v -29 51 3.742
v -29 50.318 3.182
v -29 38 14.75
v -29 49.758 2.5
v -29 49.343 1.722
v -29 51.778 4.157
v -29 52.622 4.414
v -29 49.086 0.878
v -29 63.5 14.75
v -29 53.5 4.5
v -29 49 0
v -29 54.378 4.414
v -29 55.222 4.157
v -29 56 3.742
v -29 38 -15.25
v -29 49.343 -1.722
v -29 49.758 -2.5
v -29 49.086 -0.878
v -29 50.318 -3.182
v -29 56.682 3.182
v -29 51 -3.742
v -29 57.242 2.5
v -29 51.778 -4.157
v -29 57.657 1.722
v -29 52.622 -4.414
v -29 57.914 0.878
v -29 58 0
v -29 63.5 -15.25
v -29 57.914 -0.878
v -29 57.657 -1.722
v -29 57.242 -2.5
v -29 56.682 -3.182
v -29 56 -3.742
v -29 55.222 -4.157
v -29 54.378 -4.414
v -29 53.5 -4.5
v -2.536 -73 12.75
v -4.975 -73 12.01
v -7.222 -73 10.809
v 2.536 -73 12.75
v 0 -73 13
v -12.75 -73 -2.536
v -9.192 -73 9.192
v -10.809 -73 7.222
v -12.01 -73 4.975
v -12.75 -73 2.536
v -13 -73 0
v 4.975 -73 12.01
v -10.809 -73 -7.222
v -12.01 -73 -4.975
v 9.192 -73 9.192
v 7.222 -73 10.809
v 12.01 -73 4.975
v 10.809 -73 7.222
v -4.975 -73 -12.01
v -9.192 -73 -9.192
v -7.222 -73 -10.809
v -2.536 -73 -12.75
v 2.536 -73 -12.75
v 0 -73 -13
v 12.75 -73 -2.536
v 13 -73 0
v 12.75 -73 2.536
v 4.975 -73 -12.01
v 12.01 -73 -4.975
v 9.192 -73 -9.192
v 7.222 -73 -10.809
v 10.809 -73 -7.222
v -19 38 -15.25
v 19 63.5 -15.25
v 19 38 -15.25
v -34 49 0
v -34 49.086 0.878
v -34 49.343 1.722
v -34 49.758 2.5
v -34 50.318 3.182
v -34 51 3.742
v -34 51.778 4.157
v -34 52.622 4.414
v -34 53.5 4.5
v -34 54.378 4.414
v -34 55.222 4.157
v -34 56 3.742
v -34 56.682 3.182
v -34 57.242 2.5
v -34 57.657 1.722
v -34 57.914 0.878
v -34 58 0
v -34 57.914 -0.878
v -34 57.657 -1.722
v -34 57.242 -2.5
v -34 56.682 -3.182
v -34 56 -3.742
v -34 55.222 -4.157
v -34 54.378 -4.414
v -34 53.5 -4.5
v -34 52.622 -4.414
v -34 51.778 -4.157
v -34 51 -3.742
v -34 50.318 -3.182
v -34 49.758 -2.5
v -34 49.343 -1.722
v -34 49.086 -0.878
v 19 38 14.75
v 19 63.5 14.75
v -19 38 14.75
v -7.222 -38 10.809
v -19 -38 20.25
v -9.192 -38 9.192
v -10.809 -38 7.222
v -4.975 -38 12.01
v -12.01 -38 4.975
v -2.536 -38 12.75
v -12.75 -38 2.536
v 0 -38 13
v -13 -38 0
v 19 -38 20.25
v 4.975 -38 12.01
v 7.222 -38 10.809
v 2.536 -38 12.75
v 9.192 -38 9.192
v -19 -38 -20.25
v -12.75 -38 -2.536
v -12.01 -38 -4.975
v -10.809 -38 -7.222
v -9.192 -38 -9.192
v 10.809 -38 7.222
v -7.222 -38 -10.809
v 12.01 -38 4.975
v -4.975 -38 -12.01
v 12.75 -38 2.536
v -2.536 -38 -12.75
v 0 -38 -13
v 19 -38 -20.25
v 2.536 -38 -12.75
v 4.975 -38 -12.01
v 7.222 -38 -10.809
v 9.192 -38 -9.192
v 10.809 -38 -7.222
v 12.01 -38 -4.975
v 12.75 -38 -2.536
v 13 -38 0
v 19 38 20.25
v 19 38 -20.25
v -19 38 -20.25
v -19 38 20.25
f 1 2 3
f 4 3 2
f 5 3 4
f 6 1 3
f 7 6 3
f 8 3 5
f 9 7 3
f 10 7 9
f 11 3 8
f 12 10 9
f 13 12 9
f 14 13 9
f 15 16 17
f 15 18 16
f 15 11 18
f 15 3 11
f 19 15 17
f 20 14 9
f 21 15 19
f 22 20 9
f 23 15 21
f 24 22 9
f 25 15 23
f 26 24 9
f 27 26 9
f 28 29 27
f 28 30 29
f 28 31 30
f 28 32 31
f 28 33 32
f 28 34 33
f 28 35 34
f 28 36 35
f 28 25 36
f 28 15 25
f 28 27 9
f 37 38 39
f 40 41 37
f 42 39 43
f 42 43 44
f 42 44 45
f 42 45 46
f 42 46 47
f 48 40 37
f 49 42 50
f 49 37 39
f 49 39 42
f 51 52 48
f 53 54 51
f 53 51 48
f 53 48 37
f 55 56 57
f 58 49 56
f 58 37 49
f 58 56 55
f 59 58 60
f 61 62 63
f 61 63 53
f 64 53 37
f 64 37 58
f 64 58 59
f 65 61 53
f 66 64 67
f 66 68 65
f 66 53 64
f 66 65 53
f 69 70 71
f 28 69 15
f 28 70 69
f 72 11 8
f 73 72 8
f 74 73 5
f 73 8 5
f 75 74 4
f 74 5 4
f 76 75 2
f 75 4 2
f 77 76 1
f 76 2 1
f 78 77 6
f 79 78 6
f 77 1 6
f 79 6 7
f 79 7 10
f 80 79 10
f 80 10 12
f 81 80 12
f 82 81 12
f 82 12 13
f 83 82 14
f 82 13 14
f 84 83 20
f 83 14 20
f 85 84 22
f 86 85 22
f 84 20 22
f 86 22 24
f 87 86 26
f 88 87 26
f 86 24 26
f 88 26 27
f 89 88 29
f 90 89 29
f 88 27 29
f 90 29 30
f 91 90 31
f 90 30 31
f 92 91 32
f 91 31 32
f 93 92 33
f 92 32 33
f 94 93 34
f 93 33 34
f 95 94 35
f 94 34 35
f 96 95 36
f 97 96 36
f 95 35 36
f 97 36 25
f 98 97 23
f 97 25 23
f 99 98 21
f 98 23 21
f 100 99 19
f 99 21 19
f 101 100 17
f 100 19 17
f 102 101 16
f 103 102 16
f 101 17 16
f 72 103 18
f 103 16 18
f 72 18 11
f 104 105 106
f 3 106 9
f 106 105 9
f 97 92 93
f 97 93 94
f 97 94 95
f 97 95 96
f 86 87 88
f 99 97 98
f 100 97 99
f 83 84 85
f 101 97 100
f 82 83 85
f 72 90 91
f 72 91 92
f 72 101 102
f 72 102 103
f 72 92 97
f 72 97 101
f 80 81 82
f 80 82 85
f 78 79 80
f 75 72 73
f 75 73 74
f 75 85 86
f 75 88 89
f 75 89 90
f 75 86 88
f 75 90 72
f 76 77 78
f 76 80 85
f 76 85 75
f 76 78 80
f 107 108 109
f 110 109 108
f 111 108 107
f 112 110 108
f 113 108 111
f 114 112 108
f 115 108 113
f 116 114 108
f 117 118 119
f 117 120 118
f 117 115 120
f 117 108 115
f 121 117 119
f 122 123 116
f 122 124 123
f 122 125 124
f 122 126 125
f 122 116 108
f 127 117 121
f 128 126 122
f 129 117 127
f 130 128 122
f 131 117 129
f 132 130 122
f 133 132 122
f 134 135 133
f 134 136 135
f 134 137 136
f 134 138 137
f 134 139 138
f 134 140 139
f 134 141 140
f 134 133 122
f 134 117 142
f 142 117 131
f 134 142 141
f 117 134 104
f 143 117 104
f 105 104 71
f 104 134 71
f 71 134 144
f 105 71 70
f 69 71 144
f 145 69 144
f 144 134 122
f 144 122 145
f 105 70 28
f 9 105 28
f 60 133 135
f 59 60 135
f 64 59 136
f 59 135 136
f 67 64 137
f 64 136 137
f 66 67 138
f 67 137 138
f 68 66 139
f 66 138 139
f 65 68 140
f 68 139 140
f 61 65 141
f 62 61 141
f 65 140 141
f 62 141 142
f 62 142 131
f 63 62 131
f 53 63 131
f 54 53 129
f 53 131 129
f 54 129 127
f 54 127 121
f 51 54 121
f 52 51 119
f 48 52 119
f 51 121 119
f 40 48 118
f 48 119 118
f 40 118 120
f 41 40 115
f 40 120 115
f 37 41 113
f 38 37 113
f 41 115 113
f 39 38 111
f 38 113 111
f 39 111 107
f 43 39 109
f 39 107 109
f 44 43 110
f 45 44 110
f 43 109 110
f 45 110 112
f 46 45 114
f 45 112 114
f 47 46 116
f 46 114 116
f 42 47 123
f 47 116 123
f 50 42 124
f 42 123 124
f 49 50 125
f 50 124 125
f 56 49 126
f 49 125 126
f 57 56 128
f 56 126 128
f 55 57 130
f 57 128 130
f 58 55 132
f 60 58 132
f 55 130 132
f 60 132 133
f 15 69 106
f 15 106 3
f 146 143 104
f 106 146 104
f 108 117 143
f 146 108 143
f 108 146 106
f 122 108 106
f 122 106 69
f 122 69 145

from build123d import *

# Parameters (mm, degrees)
SKETCH1_W           = 40.5
SKETCH1_H           = 76
BOSS_EXTRUDE1_DEPTH = 19
SKETCH2_R           = 13
BOSS_EXTRUDE2_DEPTH = 35
SKETCH3_W           = 48
SKETCH3_H           = 25.5
BOSS_EXTRUDE3_DEPTH = 30
SKETCH4_R           = 4.5
BOSS_EXTRUDE4_DEPTH = 5


with BuildPart() as part:
    # Sketch1 → Boss-Extrude1 (new, symmetric)
    with BuildSketch(Plane(origin=(0, 0, 0), x_dir=(0, 0, -1), z_dir=(1, 0, 0))):
        Rectangle(SKETCH1_W, SKETCH1_H)
    extrude(amount=BOSS_EXTRUDE1_DEPTH, both=True)

    # Sketch2 → Boss-Extrude2 (add)
    with BuildSketch(Plane.XZ.offset(38)):
        with Locations(Location((0, 0, 0), (0, 0, 270))):
            Circle(SKETCH2_R)
    extrude(amount=BOSS_EXTRUDE2_DEPTH)

    # Sketch3 → Boss-Extrude3 (add)
    with BuildSketch(Plane(origin=(0, 0, -15.25), x_dir=(-1, 0, 0), z_dir=(0, 0, -1))):
        with Locations((5, 50.75)):
            Rectangle(SKETCH3_W, SKETCH3_H)
    extrude(amount=-BOSS_EXTRUDE3_DEPTH)

    # Sketch4 → Boss-Extrude4 (add)
    with BuildSketch(Plane.ZY.offset(29)):
        with Locations(Location((0, 53.5, 0), (0, 0, 270))):
            Circle(SKETCH4_R)
    extrude(amount=BOSS_EXTRUDE4_DEPTH)


solid = part.part
